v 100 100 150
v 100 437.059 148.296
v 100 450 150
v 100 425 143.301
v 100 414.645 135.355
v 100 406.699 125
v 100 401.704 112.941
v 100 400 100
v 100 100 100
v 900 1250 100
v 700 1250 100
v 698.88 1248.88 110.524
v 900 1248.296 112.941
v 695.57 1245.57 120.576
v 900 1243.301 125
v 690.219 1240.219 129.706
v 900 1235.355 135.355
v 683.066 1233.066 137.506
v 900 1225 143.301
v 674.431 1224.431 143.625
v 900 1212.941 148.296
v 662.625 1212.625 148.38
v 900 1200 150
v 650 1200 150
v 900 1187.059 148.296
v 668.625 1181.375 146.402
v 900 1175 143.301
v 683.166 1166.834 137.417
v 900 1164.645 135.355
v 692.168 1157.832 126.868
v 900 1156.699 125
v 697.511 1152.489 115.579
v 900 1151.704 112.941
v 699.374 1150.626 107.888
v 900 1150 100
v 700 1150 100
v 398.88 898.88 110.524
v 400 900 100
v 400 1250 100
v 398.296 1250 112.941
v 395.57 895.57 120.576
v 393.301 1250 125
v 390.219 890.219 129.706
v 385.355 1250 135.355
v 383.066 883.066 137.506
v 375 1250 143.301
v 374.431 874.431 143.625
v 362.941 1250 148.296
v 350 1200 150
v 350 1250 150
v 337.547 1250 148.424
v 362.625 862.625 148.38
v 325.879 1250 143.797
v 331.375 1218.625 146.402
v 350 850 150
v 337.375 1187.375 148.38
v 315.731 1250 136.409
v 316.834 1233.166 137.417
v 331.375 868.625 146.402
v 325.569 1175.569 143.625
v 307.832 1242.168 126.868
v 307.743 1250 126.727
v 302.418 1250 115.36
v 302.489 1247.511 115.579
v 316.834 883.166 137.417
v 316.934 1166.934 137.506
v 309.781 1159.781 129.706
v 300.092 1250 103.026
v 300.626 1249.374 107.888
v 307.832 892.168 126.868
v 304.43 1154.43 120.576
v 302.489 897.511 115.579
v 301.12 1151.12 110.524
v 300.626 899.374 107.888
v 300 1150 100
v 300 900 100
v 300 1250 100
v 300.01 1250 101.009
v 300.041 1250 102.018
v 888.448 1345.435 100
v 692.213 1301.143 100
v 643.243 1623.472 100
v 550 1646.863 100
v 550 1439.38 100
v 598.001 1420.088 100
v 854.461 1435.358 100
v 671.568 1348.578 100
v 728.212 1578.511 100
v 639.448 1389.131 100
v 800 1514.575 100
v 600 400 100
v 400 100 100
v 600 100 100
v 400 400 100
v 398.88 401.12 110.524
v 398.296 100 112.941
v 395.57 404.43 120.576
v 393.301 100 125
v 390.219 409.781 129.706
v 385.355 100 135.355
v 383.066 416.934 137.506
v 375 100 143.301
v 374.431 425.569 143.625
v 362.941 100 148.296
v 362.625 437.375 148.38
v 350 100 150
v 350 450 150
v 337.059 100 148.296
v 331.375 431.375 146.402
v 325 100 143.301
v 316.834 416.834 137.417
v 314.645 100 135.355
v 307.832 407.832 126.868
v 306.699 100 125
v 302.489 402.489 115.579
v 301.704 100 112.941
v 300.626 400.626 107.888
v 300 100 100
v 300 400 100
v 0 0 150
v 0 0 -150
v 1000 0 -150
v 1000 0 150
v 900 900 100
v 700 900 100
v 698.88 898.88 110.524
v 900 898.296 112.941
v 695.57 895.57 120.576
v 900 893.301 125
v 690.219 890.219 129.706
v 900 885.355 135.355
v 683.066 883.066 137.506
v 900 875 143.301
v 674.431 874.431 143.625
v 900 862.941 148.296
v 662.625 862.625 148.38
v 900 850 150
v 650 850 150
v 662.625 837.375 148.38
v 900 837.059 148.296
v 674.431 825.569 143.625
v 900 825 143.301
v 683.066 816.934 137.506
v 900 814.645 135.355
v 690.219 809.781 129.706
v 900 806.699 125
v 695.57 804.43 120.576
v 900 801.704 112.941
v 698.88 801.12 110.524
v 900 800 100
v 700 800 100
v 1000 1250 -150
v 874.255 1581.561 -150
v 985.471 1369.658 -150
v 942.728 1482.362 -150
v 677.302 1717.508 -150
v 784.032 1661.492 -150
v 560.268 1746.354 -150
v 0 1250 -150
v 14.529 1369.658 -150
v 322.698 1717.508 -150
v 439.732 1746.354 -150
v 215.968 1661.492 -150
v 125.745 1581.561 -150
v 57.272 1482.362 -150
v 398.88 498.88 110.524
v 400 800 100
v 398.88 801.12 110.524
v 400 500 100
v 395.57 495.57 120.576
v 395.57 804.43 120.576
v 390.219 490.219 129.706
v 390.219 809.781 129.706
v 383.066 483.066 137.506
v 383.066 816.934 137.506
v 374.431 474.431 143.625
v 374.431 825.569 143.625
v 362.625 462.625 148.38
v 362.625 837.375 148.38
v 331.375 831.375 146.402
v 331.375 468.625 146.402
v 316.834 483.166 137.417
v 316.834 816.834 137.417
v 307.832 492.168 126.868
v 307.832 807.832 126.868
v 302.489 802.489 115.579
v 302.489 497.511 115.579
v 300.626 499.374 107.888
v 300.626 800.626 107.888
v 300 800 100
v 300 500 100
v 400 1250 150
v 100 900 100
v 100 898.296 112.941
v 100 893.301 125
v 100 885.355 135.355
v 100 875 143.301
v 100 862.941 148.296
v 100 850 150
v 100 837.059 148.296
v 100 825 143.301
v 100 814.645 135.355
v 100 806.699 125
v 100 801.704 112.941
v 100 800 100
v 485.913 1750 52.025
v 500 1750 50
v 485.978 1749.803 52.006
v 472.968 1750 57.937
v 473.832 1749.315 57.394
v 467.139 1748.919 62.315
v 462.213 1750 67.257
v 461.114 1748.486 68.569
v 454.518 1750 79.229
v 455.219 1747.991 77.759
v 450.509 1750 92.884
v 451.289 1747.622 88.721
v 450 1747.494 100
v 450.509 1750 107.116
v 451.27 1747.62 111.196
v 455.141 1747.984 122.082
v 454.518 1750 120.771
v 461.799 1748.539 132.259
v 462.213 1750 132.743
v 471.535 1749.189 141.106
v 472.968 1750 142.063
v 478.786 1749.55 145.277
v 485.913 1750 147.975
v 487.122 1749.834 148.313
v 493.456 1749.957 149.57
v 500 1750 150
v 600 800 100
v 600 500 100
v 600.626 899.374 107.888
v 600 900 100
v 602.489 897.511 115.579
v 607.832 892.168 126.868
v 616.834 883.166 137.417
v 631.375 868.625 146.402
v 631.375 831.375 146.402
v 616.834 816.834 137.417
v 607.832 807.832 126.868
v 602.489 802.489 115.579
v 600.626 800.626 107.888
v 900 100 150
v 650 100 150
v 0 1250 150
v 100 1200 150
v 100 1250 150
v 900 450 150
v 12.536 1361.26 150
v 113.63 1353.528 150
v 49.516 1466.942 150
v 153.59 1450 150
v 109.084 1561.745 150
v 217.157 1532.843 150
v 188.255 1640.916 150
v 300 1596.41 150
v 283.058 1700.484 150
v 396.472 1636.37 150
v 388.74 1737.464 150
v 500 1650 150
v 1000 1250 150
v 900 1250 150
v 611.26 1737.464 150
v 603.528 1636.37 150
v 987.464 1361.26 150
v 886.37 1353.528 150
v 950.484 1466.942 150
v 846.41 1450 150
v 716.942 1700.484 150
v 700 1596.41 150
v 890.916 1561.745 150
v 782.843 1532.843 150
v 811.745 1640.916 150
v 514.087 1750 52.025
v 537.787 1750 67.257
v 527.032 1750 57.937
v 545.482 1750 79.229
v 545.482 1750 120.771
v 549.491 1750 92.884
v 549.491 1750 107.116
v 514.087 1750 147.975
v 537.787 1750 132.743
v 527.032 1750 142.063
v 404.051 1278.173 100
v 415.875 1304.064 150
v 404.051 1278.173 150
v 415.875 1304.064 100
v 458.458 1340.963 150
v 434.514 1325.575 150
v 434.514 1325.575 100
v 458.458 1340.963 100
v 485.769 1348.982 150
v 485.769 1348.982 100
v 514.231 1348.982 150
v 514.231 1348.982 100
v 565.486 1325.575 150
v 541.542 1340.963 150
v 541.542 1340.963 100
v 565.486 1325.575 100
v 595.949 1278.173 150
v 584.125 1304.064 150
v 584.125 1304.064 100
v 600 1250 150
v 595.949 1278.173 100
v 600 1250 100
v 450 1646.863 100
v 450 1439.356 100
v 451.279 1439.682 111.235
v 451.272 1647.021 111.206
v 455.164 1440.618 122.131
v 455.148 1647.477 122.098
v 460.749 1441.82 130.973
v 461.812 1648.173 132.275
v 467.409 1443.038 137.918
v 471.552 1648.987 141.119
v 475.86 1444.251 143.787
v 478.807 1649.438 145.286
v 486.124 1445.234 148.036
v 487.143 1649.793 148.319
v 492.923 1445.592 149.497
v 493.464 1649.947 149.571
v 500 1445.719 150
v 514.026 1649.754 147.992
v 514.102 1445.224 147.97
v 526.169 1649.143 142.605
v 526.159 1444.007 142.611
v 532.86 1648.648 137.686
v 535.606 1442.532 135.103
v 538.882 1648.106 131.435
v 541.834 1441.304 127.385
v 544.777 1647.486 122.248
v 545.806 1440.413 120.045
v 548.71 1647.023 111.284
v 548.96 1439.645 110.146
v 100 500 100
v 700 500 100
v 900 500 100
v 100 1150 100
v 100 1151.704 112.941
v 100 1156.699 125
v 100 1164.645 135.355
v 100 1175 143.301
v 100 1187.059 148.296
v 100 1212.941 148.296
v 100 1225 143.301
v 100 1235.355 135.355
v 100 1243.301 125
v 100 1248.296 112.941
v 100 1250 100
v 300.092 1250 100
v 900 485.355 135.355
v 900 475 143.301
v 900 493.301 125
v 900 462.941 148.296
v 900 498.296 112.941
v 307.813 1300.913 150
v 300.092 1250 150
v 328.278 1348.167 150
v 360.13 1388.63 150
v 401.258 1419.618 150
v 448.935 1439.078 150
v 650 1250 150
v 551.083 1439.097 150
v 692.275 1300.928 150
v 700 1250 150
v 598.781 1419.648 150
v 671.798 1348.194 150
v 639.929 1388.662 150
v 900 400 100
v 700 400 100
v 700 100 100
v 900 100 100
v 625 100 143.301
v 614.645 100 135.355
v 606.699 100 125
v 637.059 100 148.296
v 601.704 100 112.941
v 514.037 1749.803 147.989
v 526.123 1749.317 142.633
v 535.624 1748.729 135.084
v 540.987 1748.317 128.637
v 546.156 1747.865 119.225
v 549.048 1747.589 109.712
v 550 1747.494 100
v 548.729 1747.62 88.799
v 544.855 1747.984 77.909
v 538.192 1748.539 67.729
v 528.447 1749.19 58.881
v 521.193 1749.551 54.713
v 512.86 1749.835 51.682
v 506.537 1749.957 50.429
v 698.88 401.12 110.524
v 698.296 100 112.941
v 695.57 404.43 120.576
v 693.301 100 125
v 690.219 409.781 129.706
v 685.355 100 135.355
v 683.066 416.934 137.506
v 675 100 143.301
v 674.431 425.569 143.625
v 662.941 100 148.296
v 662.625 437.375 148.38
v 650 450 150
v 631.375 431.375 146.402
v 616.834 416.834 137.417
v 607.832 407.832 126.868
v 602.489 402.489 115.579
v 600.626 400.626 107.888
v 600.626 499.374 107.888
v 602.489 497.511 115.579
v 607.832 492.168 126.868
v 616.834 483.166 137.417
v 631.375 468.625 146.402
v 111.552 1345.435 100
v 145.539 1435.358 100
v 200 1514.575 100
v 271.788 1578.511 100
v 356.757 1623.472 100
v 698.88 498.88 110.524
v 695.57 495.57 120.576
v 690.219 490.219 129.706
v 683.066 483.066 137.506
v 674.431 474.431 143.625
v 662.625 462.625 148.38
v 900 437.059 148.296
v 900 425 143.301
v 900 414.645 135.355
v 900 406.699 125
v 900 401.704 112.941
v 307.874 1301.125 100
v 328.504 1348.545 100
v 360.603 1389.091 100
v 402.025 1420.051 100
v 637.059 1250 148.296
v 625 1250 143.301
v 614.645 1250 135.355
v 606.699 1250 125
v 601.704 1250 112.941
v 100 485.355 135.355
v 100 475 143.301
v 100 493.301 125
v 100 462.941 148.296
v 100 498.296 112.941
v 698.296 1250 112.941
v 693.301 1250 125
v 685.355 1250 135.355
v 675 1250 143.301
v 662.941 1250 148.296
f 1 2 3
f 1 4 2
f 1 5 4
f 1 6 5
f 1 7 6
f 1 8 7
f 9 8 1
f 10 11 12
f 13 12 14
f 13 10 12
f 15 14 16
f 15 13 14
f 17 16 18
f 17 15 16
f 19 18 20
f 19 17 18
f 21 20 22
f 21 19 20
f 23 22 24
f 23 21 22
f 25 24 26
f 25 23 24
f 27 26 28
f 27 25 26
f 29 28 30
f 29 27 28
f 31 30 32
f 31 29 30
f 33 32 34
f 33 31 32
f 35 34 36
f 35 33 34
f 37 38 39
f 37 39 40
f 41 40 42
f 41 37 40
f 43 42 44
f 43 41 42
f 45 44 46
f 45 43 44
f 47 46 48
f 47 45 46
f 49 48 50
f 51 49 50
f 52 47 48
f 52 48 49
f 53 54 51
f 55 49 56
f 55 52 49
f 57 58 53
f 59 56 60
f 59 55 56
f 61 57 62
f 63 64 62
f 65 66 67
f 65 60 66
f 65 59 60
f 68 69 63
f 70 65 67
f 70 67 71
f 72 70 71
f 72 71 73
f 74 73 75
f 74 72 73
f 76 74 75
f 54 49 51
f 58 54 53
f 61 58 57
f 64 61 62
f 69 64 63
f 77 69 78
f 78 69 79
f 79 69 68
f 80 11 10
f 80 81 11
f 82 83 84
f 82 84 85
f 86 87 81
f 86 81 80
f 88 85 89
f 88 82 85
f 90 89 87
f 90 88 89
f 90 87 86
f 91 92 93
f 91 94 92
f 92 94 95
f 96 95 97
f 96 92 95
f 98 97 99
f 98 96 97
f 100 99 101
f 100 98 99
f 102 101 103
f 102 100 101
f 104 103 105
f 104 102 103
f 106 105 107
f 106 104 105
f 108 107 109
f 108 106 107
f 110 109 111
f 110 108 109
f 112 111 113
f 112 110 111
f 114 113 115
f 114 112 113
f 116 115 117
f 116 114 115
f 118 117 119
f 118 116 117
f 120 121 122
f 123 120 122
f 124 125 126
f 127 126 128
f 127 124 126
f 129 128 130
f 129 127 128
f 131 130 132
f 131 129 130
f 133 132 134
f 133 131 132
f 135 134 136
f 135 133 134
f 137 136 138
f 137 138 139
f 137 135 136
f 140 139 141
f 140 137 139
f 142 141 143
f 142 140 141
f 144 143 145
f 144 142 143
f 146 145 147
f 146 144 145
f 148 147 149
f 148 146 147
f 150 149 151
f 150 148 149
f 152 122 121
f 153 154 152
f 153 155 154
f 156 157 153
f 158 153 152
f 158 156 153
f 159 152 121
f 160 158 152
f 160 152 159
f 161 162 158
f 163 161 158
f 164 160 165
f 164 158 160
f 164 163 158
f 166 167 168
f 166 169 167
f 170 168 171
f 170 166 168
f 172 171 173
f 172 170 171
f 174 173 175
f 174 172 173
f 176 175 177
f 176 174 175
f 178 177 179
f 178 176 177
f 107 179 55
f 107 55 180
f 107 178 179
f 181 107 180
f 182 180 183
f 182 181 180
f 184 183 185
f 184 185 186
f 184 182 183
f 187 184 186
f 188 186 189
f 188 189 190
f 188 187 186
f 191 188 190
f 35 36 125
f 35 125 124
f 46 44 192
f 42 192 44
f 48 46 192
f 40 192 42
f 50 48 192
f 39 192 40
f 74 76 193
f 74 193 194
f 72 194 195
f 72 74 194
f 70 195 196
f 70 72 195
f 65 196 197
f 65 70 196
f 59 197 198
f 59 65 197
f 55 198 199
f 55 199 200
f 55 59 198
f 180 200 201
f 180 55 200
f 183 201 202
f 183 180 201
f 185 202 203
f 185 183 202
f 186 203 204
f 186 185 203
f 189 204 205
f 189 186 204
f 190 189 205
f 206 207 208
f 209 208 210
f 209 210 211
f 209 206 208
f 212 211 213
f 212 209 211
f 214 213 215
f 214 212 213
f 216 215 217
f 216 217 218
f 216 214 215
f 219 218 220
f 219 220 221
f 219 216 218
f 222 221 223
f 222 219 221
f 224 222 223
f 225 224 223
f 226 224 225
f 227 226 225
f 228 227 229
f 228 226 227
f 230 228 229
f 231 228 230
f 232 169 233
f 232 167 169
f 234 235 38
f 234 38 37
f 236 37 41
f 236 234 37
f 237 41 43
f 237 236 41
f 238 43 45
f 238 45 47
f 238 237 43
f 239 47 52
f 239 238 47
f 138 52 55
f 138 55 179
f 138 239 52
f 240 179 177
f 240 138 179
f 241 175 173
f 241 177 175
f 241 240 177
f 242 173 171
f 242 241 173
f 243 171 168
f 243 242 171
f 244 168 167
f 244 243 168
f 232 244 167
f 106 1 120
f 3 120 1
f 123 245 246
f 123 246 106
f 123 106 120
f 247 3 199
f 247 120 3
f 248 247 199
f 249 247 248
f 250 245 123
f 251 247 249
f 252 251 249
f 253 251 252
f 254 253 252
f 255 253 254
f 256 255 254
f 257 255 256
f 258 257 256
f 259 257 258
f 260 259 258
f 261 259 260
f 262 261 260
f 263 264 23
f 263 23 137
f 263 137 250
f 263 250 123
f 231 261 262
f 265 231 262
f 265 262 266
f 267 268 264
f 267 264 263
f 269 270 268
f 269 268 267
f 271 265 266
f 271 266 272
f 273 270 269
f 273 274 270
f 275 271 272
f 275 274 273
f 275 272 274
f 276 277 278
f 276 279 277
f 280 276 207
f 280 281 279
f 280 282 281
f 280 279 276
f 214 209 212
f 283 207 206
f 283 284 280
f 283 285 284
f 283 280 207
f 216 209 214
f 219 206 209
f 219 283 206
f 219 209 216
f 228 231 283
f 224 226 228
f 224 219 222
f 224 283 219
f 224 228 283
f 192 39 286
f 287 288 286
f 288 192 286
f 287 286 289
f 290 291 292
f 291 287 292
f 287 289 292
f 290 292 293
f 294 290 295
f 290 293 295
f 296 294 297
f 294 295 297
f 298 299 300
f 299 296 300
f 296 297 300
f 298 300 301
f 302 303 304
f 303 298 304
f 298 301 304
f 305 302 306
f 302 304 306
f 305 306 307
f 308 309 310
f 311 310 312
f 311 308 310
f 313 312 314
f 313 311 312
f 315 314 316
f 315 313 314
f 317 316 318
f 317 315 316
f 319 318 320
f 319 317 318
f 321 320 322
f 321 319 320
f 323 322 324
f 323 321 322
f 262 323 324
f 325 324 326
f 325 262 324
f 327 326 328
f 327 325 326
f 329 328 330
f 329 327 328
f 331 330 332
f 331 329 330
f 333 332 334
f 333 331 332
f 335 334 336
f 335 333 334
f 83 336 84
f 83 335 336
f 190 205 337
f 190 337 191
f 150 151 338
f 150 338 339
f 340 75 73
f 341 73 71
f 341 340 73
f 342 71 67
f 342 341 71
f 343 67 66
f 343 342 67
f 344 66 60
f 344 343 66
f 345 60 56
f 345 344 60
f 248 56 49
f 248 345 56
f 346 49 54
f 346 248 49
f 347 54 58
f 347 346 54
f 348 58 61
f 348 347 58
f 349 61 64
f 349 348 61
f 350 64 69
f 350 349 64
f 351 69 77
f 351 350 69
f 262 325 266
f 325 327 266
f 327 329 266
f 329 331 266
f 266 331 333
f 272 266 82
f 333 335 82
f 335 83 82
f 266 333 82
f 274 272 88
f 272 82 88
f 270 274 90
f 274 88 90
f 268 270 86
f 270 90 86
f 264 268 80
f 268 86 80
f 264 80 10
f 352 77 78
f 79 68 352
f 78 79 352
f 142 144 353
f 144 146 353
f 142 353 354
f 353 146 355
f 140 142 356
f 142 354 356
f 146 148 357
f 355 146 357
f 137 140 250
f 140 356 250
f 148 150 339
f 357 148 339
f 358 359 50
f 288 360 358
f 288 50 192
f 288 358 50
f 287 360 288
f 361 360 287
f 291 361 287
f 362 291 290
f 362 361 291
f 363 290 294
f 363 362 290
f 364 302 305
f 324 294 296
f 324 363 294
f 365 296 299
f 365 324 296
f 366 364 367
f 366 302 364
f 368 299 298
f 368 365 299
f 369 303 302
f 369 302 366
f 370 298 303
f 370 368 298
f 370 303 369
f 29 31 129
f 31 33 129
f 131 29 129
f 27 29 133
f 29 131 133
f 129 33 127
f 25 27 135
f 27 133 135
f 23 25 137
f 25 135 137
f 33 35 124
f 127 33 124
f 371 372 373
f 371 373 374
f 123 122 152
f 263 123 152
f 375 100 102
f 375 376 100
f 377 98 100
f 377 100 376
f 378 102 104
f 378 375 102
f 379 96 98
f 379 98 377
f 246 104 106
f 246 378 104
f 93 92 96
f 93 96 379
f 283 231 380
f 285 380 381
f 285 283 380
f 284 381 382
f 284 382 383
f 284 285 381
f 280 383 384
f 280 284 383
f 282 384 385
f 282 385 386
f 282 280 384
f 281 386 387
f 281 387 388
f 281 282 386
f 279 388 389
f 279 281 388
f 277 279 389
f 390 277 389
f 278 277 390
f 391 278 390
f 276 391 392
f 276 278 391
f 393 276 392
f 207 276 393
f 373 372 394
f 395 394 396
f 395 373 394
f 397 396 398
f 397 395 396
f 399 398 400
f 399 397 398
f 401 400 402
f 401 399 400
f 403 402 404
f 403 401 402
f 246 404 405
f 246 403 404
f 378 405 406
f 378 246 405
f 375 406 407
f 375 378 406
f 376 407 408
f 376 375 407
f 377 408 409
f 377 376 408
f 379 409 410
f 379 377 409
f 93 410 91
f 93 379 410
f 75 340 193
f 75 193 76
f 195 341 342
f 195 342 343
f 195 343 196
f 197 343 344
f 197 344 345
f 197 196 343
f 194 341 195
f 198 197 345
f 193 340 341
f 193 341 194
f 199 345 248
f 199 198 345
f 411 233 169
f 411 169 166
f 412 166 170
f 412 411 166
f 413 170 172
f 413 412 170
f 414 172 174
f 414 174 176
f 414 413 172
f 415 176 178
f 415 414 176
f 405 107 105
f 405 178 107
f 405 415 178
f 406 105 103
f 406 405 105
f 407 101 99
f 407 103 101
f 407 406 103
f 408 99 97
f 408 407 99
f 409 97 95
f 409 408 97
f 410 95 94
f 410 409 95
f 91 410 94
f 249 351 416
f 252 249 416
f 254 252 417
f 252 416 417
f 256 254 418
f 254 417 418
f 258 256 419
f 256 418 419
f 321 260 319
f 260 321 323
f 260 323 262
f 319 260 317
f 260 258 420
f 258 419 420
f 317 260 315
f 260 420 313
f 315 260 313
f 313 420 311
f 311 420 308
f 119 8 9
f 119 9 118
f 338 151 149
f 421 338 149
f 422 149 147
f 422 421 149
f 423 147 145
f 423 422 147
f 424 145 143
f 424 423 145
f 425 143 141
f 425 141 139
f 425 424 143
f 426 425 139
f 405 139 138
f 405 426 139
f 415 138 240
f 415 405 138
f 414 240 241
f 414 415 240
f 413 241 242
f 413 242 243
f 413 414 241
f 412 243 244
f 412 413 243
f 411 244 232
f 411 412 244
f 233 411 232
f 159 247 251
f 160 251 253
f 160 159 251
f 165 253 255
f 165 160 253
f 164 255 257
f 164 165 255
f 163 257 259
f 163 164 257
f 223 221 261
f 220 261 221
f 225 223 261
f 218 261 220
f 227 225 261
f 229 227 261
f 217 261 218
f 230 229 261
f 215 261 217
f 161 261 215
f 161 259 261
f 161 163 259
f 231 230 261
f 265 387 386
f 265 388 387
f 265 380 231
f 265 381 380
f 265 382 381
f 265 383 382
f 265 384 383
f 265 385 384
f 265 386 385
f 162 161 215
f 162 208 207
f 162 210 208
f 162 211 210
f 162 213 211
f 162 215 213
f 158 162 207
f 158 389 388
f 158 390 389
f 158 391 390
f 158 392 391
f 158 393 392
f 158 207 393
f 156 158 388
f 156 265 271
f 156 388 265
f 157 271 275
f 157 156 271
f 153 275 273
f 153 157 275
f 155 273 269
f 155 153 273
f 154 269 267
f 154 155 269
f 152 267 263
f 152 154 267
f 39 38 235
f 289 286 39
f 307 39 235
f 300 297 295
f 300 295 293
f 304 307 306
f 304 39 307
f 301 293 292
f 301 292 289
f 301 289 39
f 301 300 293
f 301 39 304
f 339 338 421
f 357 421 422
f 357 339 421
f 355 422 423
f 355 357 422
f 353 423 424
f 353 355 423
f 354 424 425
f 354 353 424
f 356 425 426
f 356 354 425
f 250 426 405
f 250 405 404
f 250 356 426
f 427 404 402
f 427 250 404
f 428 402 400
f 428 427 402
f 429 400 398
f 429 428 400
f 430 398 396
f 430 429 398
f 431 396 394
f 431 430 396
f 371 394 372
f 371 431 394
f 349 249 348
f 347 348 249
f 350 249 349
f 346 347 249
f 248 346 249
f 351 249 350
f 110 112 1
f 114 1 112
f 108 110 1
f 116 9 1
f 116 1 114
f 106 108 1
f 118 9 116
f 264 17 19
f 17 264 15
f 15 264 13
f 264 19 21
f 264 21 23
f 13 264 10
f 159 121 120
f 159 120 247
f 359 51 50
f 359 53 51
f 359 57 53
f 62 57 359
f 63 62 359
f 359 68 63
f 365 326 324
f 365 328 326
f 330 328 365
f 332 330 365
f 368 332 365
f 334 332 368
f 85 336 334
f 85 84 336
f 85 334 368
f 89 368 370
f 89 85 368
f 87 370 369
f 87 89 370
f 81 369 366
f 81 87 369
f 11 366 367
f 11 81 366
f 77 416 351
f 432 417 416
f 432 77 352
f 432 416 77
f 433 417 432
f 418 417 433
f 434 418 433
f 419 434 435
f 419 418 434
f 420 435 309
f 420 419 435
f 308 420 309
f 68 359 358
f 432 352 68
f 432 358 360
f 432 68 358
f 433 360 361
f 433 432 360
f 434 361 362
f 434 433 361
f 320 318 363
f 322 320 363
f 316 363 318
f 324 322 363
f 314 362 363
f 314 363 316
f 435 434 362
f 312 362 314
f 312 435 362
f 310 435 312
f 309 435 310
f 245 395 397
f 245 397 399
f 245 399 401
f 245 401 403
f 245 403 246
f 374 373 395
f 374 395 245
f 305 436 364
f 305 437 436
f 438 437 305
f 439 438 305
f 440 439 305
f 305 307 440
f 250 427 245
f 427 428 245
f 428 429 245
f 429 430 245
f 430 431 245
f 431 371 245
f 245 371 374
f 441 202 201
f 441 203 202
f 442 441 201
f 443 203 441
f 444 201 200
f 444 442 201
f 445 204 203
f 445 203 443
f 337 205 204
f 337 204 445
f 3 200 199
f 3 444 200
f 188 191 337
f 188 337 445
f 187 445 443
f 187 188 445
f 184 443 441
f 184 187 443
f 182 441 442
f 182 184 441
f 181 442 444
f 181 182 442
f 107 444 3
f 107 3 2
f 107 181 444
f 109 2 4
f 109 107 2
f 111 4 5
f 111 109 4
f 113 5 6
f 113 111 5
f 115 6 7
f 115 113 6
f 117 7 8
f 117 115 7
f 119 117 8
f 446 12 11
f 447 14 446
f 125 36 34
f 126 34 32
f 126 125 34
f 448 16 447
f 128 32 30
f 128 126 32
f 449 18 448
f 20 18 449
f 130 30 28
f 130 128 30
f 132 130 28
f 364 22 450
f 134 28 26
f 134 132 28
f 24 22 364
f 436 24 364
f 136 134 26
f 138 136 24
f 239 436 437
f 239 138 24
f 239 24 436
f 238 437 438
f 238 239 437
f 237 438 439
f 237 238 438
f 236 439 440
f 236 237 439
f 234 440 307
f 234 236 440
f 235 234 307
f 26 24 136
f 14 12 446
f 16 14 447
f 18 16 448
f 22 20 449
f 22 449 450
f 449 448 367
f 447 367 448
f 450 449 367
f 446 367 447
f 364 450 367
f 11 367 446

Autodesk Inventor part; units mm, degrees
ref_plane "YZ Plane" through (0, 0, 0) normal (1, 0, 0) x (0, 1, 0)
ref_plane "XY Plane" through (0, 0, 0) normal (0, 0, 1) x (1, 0, 0)
sketch "Sketch1" plane through (0, 0, 0) normal (0, 0, 1) x (1, 0, 0)
  line L0 (0, 0) -> (1000, 0)
  line L1 (1000, 0) -> (1000, 1250)
  line L2 (1000, 1250) -> (0, 1250)
  line L3 (0, 1250) -> (0, 0)
  dimension "d0" = 1000
  dimension "d1" = 1250
extrude "Extrusion1" add sketch "Sketch1" along normal blind 100
sketch "Sketch2" plane through (0, 0, 0) normal (0, 0, -1) x (-1, 0, 0)
  line L0 (-1000, 1250) -> (0, 1250) projected
  circle A0 centre (-500, 1250) radius 500
  point P0 (0, 0)
  dimension "d4" = 1000
extrude "Extrusion2" add sketch "Sketch2" against normal blind 100 contours A0 L0 picked at (-386.6625, 1415.594)
sketch "Sketch3" plane through (0, 0, 0) normal (0, -1, 0) x (1, 0, 0)
  line L0 (0, 100) -> (1000, 100) projected
  circle A0 centre (350, 100) radius 50
  circle A1 centre (650, 100) radius 50
  line L1 (0, 0) -> (0, 100) projected
  line L2 (1000, 0) -> (1000, 100) projected
  point P0 (1000, 50)
  dimension "d7" = 100
  dimension "d8" = 100
  dimension "d9" = 350
  dimension "d10" = 350
extrude "Extrusion3" add sketch "Sketch3" against normal blind 1250
sketch "Sketch4" plane through (1000, 0, 100) normal (1, 0, 0) x (0, 0, -1)
  line L0 (0, 1250) -> (0, 0) projected
  circle A0 centre (0, 450) radius 50
  circle A1 centre (0, 850) radius 50
  line L1 (100, 0) -> (0, 0) projected
  line L2 (100, 1250) -> (0, 1250) projected
  dimension "d13" = 100
  dimension "d14" = 100
  dimension "d15" = 450
  dimension "d16" = 400
  dimension "d17" = 400
extrude "Extrusion4" add sketch "Sketch4" against normal blind 1000
sketch "Sketch5" plane through (0, 0, 100) normal (0, 0, 1) x (1, 0, 0)
  line L0 (700, 1250) -> (600, 1250) projected
  line L1 (400, 1250) -> (300, 1250) projected
  arc A0 (600, 1250) -> (400, 1250) centre (500, 1250) ccw
  arc A1 (700, 1250) -> (300.0458, 1245.6914) centre (500.0458, 1245.7187) ccw
  point P0 (0, 0)
  point P1 (300.0917, 1250)
  dimension "d20" = 100
  dimension "d21" = 200
extrude "Extrusion5" add sketch "Sketch5" along normal blind 50
sketch "Sketch6" plane through (1000, 0, 100) normal (1, 0, 0) x (0, 0, -1)
  line L0 (0, 900) -> (0, 1250) projected
  circle A0 centre (0, 1200) radius 50
  line L1 (100, 1250) -> (0, 1250) projected
  point P0 (100, 0)
  dimension "d24" = 100
  dimension "d25" = 50
extrude "Extrusion6" add sketch "Sketch6" against normal up to surface
sketch "Sketch7" plane through (0, 0, 0) normal (-1, 0, 0) x (0, 0, 1)
  line L0 (100, 900) -> (100, 1250) projected
  circle A0 centre (100, 1200) radius 50
  line L1 (0, 1250) -> (100, 1250) projected
  point P0 (0, 0)
  dimension "d28" = 100
  dimension "d29" = 50
extrude "Extrusion7" add sketch "Sketch7" against normal up to surface
ref_plane "Work Plane1" through (0, 1750, 0) normal (0, 1, 0) x (-1, 0, 0)
sketch "Sketch8" plane through (0, 1750, 0) normal (0, 1, 0) x (-1, 0, 0)
  line L0 (-400, 100) -> (-600, 100) projected
  circle A0 centre (-500, 100) radius 50
  point P0 (0, 0)
  dimension "d33" = 100
extrude "Extrusion8" add sketch "Sketch8" against normal up to surface
sketch "Sketch9" plane through (0, 0, 100) normal (0, 0, 1) x (1, 0, 0)
  line L0 (1000, 1150) -> (700, 1150) projected
  line L1 (900, 1150) -> (900, 902.0075)
  line L2 (1000, 900) -> (1000, 1150) projected
  line L3 (1000, 800) -> (700, 800) projected
  line L4 (900, 800) -> (900, 0)
  line L5 (0, 0) -> (1000, 0) projected
  line L6 (100, 0) -> (100, 1250)
  line L7 (0, 1250) -> (300, 1250) projected
  line L8 (0, 800) -> (0, 500) projected
  arc A0 (1000, 1250) -> (0, 1250) centre (500, 1250) ccw projected
  line L9 (0, 1250) -> (0, 0) projected
  line L10 (0, 1250) -> (0, 0)
  line L11 (700, 1250) -> (1000, 1250) projected
  line L12 (1000, 1250) -> (1000, 0)
  arc A1 (900, 1250) -> (100, 1250) centre (500, 1250) ccw
  point P0 (900, 1026.0038)
  point P1 (100, 625)
  dimension "d36" = 100
  dimension "d37" = 100
extrude "Extrusion9" add sketch "Sketch9" along normal blind 50 contours L11 A1 L7 A0
sketch "Sketch10" plane through (0, 0, 100) normal (0, 0, 1) x (1, 0, 0)
  arc A0 (900, 1250) -> (550, 1646.8627) centre (500, 1250) ccw projected
  line L0 (900, 1250) -> (900, 0)
  line L1 (1000, 0) -> (1000, 1250) projected
  line L2 (1000, 1250) -> (1000, 0)
  line L3 (1000, 1150) -> (700, 1150) projected
  line L4 (900, 1150) -> (1000, 1150)
  line L5 (0, 0) -> (1000, 0) projected
  line L6 (900, 0) -> (1000, 0)
extrude "Extrusion10" add sketch "Sketch10" along normal blind 50
sketch "Sketch11" plane through (0, 0, 100) normal (0, 0, 1) x (1, 0, 0)
  line L0 (100, 1250) -> (100, 0)
  line L1 (0, 0) -> (300, 0) projected
  line L2 (0, 0) -> (0, 1250)
  line L3 (0, 400) -> (0, 0) projected
  line L4 (0, 1250) -> (100, 1250)
  line L5 (0, 0) -> (100, 0)
extrude "Extrusion11" add sketch "Sketch11" along normal blind 50
sketch "Sketch12" plane through (0, 0, 100) normal (0, 0, 1) x (1, 0, 0)
  line L0 (700, 1250) -> (900, 1250) projected
  line L1 (900, 1250) -> (900, 1150)
  line L2 (900, 1150) -> (1000, 1150)
  line L3 (900, 1250) -> (1000, 1250) projected
  line L4 (1000, 1150) -> (1000, 1250)
  line L5 (1000, 1250) -> (900, 1250)
  point P0 (0, 0)
extrude "Extrusion12" add sketch "Sketch12" along normal blind 50
sketch "Sketch13" plane through (0, 0, 100) normal (0, 0, 1) x (1, 0, 0)
  line L0 (0, 1250) -> (0, 0) projected
  line L1 (0, 100) -> (1042, 100)
  line L2 (400, 0) -> (600, 0) projected
  line L3 (0, 0) -> (100, 0) projected
  line L4 (0, 100) -> (0, 0)
  line L5 (900, 0) -> (1000, 0) projected
  line L6 (0, 0) -> (1000, 0)
  line L7 (1000, 0) -> (1000, 100)
  line L8 (1000, 0) -> (1000, 1250) projected
  point P0 (500, 0)
  point P1 (521, 100)
  dimension "d46" = 100
extrude "Extrusion13" add sketch "Sketch13" along normal blind 50
sketch "Sketch14" plane through (0, 0, 0) normal (0, 0, -1) x (-1, 0, 0)
  arc A0 (-500, 1750) -> (-1000, 1250) centre (-500, 1250) ccw projected
  line L0 (-1000, 0) -> (-1000, 1250) projected
  line L1 (-1000, 1250) -> (-1000, 0)
  line L2 (0, 0) -> (-1000, 0) projected
  line L3 (-1000, 0) -> (0, 0)
  arc A1 (0, 1250) -> (-500, 1750) centre (-500, 1250) ccw projected
  line L4 (0, 0) -> (0, 1250)
  line L5 (0, 1250) -> (-1000, 1250)
  circle A2 centre (-500, 1250) radius 500
extrude "Extrusion14" add sketch "Sketch14" along normal blind 150
properties part number "WindowofShip11"
